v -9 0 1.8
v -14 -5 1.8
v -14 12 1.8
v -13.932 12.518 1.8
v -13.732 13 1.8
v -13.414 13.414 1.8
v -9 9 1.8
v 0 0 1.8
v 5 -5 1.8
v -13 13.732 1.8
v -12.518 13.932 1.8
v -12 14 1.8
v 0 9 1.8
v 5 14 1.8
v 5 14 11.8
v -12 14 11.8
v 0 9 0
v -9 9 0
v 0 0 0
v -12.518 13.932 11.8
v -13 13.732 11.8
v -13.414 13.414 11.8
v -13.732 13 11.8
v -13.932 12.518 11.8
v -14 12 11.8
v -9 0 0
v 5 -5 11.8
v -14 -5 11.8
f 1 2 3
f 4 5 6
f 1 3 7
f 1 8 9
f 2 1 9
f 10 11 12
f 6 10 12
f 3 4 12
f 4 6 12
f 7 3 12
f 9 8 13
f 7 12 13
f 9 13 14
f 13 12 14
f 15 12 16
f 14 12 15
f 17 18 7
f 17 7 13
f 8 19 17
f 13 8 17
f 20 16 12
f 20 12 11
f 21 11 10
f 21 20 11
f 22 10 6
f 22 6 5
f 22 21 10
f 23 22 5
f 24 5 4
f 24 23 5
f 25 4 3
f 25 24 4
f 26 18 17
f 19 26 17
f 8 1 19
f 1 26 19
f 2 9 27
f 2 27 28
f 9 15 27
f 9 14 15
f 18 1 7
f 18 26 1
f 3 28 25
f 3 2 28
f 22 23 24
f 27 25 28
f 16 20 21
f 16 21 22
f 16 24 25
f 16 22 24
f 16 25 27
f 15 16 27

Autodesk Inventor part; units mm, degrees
ref_plane "YZ Plane" through (0, 0, 0) normal (1, 0, 0) x (0, 1, 0)
ref_plane "XZ Plane" through (0, 0, 0) normal (0, 1, 0) x (-1, 0, 0)
ref_plane "XY Plane" through (0, 0, 0) normal (0, 0, 1) x (1, 0, 0)
sketch "Esquisse1" plane through (0, 0, 0) normal (0, 0, 1) x (1, 0, 0)
  line L0 (0, -1.8) -> (0, 10.8) projected
  line L1 (-10.8, 0) -> (1.8, 0) projected
  line L2 (0, 0) -> (-9, 0)
  line L3 (-9, 0) -> (-9, 9)
  line L4 (-9, 9) -> (0, 9)
  line L5 (0, 9) -> (0, 0)
  point P0 (0, 9)
  dimension "d0" = 9
  dimension "d1" = 9
extrude "Extrusion1" add sketch "Esquisse1" along normal blind 1.8
sketch "Esquisse2" plane through (0, 0, 1.8) normal (0, 0, 1) x (1, 0, 0)
  line L0 (-14, 14) -> (5, 14)
  line L1 (5, 14) -> (5, -5)
  line L2 (5, -5) -> (-14, -5)
  line L3 (-14, -5) -> (-14, 14)
  line L4 (-9, 9) -> (-9, 0) projected
  line L5 (0, 9) -> (-9, 9) projected
  line L6 (0, 0) -> (0, 9) projected
  line L7 (-9, 0) -> (0, 0) projected
  dimension "d4" = 5
  dimension "d5" = 5
  dimension "d6" = 5
  dimension "d7" = 5
extrude "Extrusion2" add sketch "Esquisse2" along normal blind 10 contours L0 L1 L2 L3 | L5 L6 L7 L4
fillet "Congé1" radius 2 1 edges at (-14, 14, 6.8)
properties part number "pied_coque"
